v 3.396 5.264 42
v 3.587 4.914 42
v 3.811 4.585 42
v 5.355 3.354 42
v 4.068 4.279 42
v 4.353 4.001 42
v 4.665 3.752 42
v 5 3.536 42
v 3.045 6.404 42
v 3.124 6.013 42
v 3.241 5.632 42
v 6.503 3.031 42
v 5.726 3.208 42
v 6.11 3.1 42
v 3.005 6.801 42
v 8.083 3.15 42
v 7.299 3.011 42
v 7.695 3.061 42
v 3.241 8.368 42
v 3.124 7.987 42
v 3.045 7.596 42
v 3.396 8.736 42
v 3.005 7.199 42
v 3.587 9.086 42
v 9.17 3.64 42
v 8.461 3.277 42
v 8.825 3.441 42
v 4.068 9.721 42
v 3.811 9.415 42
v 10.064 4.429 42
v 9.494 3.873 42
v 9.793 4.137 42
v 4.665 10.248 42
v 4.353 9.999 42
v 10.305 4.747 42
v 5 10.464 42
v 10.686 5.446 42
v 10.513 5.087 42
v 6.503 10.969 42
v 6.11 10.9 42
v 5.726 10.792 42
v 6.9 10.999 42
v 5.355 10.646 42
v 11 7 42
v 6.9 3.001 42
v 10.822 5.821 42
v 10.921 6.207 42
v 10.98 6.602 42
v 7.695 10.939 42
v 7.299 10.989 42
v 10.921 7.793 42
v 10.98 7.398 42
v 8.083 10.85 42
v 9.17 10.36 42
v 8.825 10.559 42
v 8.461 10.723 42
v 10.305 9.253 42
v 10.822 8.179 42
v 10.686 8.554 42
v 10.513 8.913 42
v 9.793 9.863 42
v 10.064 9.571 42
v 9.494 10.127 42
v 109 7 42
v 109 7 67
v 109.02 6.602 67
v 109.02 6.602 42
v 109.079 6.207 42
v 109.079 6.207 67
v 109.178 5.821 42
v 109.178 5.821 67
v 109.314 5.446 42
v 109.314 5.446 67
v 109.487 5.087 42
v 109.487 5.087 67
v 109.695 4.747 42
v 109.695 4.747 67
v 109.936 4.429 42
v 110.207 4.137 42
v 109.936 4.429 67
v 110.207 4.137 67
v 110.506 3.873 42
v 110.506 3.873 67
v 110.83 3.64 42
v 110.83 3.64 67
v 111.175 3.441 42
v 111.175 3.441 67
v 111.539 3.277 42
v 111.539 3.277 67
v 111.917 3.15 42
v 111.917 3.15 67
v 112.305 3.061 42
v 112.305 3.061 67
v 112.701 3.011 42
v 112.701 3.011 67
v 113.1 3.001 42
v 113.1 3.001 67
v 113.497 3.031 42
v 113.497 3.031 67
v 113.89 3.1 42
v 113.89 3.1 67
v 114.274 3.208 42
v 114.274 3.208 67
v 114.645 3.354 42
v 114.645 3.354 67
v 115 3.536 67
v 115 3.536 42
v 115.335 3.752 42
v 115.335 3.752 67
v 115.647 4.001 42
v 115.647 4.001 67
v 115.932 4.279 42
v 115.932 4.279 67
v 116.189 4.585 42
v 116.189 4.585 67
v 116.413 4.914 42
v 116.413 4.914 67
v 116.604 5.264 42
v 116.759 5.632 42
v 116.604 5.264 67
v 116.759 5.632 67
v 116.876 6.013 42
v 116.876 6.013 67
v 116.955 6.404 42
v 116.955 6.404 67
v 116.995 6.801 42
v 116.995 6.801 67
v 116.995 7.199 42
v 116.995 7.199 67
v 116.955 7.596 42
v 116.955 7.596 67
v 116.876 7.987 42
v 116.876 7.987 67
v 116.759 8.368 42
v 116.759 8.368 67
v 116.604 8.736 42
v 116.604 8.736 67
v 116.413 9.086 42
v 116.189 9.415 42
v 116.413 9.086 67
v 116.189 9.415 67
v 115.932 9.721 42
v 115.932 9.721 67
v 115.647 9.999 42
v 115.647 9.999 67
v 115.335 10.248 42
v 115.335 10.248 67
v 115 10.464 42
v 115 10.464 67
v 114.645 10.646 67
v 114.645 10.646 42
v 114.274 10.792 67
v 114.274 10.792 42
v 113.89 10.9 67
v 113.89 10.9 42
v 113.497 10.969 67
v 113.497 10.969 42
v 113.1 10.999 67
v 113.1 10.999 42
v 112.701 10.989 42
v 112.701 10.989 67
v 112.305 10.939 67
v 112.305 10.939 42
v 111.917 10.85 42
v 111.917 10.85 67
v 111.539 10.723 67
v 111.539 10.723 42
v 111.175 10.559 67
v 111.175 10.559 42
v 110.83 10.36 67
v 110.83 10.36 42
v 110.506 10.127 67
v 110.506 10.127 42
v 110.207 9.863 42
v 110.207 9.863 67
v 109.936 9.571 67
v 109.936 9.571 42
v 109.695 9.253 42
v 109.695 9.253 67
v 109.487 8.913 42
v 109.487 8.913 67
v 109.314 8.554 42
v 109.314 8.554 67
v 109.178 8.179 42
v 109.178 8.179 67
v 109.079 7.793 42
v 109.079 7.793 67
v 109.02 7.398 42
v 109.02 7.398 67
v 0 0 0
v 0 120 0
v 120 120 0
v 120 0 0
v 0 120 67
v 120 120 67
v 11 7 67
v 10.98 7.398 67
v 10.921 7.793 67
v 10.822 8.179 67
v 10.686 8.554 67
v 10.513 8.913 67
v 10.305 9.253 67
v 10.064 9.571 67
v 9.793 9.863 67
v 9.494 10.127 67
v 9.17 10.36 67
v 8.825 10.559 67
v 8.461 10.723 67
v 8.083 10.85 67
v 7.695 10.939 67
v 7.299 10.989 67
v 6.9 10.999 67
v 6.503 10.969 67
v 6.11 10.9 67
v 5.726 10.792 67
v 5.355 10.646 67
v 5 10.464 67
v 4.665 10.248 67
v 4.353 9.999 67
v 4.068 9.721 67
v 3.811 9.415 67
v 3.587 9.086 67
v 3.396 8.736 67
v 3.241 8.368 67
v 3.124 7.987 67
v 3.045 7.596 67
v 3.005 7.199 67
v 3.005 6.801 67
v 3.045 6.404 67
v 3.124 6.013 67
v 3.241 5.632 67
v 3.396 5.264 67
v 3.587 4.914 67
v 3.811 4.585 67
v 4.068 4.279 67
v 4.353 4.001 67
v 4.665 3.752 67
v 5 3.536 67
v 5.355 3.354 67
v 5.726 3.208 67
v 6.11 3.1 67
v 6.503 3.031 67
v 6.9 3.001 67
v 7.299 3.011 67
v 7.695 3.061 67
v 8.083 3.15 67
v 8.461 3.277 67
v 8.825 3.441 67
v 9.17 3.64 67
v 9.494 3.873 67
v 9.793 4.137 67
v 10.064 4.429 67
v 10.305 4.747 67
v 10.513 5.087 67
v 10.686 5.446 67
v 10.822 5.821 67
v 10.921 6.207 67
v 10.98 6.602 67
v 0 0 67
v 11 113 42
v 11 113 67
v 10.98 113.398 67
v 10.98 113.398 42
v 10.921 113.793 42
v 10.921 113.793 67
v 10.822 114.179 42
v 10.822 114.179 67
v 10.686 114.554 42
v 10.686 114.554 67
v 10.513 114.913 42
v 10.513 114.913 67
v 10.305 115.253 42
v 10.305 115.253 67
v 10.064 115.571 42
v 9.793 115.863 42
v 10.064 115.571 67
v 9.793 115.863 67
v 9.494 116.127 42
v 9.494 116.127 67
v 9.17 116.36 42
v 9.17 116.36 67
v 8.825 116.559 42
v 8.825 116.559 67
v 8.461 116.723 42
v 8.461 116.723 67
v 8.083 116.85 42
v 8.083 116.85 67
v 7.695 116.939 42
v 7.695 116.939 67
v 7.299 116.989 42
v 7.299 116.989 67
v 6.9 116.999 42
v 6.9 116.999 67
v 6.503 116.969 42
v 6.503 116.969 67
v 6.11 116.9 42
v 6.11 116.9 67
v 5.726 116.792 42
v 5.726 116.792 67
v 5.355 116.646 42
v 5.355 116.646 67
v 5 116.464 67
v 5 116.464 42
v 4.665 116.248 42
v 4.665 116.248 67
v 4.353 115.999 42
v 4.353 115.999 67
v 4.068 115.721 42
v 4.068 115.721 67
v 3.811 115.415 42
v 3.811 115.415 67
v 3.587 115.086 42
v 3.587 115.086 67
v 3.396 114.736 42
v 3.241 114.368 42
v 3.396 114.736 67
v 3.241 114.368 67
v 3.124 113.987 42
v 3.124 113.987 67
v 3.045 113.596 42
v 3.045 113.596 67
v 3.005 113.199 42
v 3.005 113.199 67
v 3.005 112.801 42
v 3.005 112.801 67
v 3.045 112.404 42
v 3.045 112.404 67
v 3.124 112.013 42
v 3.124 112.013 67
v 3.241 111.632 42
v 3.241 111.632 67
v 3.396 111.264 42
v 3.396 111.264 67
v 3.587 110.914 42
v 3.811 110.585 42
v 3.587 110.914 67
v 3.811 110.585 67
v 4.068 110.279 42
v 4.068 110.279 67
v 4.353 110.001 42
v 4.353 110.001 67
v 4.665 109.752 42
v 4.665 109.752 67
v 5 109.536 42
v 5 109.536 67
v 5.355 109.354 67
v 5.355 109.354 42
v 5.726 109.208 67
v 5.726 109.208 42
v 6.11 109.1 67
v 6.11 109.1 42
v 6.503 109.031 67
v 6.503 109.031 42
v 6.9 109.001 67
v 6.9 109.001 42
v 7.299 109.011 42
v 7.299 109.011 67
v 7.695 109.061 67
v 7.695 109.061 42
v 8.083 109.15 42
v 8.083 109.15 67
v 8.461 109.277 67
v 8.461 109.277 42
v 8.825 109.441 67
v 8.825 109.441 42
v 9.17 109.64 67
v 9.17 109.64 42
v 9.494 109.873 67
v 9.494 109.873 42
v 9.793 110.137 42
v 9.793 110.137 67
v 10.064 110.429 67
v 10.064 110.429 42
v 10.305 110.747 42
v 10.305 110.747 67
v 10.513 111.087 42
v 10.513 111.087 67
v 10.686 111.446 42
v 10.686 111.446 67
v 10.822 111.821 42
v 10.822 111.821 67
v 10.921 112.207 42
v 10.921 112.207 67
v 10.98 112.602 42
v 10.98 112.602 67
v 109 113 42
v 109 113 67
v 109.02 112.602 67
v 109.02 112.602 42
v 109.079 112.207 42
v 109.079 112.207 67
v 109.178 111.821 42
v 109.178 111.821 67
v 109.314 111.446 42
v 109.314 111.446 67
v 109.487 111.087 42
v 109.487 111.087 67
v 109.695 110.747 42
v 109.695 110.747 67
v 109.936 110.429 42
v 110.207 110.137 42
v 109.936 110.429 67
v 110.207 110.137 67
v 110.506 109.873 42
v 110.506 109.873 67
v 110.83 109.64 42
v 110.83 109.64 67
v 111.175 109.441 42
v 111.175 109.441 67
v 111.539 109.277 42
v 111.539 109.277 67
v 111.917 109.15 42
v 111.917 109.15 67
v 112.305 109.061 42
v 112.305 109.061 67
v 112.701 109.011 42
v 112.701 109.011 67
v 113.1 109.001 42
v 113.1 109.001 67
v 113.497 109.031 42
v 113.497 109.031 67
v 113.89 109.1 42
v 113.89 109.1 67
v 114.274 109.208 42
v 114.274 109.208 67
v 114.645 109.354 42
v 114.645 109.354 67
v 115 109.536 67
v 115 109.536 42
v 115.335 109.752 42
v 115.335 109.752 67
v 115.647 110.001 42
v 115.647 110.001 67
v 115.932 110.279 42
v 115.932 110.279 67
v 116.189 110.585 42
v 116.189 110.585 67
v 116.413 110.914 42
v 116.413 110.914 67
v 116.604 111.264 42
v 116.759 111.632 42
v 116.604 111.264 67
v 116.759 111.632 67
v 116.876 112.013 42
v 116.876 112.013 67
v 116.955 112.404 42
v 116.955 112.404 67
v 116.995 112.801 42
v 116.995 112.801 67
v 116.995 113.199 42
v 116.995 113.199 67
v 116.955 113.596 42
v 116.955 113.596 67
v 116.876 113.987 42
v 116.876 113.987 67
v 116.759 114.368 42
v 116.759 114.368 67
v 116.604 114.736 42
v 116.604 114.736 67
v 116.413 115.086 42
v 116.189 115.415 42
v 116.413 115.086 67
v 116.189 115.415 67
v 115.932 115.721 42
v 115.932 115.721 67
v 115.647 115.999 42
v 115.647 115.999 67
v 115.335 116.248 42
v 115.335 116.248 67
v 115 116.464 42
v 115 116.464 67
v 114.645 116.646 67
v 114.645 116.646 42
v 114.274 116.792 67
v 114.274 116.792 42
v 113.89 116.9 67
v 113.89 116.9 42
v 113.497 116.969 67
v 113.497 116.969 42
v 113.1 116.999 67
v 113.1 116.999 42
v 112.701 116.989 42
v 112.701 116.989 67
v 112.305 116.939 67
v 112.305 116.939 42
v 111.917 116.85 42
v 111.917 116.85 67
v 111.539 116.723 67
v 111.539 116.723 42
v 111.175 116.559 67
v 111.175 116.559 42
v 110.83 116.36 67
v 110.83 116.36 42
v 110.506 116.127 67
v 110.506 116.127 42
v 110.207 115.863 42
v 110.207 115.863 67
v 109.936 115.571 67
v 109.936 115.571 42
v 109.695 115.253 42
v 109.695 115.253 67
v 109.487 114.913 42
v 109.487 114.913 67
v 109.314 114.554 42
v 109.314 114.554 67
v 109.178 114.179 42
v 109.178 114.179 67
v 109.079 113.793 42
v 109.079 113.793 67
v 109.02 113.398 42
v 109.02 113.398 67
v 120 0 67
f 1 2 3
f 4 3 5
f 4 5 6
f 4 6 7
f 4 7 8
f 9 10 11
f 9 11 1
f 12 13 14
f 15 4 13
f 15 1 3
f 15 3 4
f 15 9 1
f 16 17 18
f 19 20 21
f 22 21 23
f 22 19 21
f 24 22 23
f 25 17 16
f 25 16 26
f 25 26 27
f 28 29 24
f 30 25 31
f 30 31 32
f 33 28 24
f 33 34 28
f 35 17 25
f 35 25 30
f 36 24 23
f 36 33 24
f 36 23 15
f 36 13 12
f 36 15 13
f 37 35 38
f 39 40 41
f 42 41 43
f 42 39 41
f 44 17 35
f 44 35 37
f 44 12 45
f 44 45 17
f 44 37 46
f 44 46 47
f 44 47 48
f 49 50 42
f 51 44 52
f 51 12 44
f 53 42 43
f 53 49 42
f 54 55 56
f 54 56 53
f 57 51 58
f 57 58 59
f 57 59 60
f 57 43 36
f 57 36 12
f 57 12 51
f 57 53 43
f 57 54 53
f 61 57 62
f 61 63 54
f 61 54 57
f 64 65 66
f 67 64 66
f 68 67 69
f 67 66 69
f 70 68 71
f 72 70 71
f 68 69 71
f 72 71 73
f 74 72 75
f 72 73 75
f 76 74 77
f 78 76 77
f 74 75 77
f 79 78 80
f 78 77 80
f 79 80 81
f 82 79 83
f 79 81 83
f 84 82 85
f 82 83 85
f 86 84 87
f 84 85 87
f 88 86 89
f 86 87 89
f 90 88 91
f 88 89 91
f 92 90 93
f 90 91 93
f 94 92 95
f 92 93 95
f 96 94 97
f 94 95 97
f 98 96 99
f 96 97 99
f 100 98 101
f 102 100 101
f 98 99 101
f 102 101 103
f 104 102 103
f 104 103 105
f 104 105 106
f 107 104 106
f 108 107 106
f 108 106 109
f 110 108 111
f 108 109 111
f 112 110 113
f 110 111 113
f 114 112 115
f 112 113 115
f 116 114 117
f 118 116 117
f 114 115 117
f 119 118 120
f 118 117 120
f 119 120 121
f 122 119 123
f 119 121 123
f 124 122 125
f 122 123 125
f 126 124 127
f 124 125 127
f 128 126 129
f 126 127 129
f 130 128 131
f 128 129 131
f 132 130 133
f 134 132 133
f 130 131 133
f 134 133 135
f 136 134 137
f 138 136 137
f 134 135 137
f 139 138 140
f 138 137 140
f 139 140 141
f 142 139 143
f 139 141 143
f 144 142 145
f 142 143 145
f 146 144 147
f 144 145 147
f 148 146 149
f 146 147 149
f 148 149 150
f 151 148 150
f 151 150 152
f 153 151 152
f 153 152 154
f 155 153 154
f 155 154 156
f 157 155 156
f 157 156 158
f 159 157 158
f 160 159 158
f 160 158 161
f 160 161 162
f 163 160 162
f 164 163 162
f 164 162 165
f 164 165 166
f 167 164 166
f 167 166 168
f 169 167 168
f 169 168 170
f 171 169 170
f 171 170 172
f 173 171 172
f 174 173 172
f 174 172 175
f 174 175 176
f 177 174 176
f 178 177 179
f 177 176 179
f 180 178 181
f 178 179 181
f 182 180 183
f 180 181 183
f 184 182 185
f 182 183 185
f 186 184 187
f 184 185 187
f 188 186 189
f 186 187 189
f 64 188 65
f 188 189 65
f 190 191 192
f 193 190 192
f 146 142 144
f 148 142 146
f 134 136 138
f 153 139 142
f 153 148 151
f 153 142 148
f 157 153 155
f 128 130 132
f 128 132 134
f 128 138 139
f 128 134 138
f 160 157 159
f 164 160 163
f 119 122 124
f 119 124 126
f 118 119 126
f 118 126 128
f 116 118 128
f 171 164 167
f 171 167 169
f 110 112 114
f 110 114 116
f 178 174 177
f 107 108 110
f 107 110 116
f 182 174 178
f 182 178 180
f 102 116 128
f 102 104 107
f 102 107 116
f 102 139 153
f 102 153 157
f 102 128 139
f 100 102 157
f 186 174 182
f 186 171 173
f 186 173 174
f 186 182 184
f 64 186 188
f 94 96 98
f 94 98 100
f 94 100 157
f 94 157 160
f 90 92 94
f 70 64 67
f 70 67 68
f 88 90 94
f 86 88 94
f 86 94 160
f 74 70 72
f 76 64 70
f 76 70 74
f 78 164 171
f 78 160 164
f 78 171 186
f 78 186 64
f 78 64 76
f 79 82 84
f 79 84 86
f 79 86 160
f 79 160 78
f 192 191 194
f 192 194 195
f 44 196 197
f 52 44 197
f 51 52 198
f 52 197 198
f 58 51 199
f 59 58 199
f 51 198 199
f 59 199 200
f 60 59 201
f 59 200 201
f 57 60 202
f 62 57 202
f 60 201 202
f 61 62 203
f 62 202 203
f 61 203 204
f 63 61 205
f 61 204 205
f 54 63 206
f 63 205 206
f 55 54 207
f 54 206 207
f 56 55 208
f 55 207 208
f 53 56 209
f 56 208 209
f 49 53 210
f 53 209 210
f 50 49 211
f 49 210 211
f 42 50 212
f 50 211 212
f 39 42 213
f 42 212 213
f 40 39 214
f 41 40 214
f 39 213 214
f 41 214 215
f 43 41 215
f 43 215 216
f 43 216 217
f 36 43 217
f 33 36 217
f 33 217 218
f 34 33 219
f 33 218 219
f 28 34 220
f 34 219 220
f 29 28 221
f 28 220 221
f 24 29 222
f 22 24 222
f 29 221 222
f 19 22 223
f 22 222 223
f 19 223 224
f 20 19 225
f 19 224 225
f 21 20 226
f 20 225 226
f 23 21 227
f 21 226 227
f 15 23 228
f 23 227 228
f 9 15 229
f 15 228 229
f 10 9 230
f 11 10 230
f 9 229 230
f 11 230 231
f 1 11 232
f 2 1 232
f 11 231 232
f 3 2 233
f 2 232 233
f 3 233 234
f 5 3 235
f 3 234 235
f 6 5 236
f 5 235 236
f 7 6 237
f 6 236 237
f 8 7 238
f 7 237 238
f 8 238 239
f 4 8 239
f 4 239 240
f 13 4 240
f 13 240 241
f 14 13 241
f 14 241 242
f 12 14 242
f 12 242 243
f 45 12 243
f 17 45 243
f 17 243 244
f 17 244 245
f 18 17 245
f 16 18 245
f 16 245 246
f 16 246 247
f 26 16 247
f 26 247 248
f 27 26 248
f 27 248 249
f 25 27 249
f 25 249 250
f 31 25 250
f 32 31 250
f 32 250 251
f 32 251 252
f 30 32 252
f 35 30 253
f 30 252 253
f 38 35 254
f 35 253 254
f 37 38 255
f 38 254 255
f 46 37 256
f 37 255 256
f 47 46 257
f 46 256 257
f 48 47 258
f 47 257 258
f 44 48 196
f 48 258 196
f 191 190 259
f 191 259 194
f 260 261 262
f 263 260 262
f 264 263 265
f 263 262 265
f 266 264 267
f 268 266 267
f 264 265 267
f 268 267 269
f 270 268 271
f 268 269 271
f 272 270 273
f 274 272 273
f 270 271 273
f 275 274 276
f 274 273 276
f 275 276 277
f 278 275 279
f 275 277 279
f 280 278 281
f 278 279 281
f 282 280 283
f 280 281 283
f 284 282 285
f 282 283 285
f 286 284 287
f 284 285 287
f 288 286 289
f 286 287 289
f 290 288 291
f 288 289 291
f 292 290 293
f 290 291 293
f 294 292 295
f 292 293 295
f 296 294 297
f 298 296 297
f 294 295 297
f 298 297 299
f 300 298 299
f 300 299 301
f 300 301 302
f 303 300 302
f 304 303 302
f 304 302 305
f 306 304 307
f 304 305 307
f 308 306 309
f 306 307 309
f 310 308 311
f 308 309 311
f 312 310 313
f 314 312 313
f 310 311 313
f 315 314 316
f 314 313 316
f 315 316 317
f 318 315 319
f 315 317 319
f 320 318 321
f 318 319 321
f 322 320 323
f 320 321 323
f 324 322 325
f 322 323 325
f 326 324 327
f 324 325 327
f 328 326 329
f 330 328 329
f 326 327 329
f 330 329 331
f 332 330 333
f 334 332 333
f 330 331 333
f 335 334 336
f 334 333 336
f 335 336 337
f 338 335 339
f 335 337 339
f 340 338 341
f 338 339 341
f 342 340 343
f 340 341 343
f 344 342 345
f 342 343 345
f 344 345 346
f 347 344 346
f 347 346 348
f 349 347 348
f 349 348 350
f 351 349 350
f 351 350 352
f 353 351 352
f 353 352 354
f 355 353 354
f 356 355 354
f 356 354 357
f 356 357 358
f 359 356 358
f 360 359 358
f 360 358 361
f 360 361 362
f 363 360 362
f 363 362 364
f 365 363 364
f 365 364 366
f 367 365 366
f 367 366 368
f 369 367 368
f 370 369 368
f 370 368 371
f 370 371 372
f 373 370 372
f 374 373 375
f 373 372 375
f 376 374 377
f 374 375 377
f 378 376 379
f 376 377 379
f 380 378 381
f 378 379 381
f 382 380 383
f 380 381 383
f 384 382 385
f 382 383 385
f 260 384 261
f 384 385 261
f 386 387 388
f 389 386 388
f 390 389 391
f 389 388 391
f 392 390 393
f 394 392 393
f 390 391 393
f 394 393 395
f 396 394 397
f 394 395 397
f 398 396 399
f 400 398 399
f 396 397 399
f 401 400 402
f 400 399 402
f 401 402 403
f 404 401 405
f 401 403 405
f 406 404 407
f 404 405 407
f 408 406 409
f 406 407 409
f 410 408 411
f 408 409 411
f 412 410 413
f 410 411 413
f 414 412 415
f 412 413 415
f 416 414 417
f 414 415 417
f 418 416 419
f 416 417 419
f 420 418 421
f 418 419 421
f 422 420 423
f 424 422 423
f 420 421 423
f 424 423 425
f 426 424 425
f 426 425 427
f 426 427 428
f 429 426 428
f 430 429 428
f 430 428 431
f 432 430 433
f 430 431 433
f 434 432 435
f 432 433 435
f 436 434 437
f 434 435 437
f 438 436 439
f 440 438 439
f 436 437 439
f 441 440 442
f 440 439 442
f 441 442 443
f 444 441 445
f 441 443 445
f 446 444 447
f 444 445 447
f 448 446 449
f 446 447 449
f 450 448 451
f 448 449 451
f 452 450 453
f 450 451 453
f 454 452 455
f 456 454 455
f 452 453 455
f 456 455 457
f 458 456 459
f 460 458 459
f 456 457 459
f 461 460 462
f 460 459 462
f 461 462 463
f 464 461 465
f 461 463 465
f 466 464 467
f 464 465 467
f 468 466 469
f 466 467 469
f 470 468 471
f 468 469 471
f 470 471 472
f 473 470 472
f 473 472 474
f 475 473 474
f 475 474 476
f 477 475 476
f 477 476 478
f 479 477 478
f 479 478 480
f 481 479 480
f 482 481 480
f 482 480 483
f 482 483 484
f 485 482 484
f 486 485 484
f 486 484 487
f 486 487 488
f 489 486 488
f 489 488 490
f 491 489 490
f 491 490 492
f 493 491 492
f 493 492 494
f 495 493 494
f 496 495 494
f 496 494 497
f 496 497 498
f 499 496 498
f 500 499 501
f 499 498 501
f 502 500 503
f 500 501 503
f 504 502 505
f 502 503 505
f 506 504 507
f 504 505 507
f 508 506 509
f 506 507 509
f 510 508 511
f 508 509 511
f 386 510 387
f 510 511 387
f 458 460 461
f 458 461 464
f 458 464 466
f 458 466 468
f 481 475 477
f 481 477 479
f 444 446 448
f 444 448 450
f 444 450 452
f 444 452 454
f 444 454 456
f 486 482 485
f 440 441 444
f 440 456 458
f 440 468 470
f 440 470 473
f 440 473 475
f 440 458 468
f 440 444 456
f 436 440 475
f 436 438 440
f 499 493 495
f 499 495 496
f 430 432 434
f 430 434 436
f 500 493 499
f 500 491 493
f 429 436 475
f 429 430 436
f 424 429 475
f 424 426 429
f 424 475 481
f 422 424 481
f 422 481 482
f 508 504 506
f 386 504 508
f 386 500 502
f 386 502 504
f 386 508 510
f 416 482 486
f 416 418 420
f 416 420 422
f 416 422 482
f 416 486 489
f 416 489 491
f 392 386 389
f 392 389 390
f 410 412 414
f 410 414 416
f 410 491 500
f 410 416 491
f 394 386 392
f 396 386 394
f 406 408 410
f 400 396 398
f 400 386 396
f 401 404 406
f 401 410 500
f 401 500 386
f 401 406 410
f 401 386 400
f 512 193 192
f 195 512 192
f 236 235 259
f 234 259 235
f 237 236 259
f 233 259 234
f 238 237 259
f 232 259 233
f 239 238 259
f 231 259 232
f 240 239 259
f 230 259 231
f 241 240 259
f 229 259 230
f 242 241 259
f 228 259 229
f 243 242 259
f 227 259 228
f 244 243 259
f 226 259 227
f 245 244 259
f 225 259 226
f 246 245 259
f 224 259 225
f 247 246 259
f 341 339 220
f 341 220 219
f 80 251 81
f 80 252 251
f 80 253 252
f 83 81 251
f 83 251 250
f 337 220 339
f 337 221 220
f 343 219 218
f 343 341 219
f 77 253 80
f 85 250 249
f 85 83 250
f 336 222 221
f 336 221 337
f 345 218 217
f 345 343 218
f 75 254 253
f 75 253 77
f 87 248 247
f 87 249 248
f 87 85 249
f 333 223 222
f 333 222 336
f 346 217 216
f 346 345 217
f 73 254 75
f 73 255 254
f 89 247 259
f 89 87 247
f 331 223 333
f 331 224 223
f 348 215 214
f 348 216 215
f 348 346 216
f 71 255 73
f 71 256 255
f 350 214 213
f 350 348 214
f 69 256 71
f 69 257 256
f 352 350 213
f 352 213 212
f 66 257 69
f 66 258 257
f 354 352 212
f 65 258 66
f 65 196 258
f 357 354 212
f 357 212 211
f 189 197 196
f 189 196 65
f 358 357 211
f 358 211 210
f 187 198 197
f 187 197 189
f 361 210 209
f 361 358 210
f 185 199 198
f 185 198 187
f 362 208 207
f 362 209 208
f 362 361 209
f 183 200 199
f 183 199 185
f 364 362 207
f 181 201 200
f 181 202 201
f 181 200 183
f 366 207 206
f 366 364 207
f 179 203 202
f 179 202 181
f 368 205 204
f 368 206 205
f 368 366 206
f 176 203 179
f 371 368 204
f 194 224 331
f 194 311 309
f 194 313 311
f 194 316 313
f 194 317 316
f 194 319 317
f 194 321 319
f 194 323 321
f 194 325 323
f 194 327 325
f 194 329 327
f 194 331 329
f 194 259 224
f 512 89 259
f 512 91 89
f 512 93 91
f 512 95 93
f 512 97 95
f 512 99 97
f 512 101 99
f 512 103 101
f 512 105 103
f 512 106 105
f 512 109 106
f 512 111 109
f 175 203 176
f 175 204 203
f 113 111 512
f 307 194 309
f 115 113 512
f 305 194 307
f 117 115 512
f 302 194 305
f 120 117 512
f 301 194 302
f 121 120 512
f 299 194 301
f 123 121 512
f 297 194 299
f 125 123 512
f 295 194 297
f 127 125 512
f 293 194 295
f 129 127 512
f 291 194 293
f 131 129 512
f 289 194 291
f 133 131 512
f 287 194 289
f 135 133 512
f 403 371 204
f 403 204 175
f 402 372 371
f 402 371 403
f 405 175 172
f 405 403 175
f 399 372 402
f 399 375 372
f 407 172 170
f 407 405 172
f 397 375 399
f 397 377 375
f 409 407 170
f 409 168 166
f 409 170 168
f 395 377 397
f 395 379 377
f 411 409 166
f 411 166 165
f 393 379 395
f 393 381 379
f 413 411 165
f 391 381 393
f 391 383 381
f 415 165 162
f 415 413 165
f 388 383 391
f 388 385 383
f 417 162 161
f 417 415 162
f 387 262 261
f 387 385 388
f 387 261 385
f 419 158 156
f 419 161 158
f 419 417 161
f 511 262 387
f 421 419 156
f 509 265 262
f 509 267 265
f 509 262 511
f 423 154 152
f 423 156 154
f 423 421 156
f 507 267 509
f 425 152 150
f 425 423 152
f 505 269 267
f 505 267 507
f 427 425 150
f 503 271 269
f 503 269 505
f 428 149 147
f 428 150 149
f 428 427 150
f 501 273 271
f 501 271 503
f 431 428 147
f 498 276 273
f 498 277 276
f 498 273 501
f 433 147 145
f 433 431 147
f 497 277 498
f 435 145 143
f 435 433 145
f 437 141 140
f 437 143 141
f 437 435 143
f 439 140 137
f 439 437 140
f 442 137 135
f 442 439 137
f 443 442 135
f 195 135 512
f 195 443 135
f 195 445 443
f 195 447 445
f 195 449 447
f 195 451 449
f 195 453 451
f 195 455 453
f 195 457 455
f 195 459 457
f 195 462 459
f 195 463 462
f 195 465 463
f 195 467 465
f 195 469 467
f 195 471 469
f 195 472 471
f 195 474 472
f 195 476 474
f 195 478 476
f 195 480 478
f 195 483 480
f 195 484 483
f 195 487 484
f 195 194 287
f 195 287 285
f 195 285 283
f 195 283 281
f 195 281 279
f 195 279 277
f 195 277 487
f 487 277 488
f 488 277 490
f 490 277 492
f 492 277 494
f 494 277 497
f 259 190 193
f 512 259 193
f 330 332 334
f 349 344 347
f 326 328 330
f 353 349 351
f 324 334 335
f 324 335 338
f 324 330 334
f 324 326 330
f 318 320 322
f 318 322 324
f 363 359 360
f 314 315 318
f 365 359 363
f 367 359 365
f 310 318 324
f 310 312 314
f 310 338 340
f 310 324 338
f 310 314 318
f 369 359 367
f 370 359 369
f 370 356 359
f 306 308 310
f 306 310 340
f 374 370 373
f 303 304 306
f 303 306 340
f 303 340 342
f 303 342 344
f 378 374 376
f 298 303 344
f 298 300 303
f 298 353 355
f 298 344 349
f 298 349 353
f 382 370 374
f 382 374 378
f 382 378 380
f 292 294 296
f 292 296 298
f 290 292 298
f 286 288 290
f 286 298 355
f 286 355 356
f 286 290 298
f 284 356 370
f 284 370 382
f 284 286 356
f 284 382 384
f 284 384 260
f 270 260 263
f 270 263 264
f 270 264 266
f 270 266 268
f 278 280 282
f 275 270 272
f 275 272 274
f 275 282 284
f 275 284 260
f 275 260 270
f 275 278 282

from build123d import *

# Parameters (mm, degrees)
SZKIC1_W                    = 120
SZKIC1_H                    = 120
DODANIE_WYCI_GNI_CIE1_DEPTH = 67
SZKIC5_R                    = 4
WYTNIJ_WYCI_GNI_CIE1_DEPTH  = 25


with BuildPart() as part:
    # Szkic1 → Dodanie-wyciągnięcie1 (new body)
    with BuildSketch(Plane.XY):
        with Locations((60, 60)):
            Rectangle(SZKIC1_W, SZKIC1_H)
    extrude(amount=DODANIE_WYCI_GNI_CIE1_DEPTH)

    # Szkic5 → Wytnij-wyciągnięcie1 (cut)
    with BuildSketch(Plane.XY.offset(67)):
        with Locations((7, 113)):
            Circle(SZKIC5_R)
        with Locations((7, 7)):
            Circle(SZKIC5_R)
        with Locations(Location((113, 113, 0), (0, 0, 180))):
            Circle(SZKIC5_R)
        with Locations(Location((113, 7, 0), (0, 0, 180))):
            Circle(SZKIC5_R)
    extrude(amount=-WYTNIJ_WYCI_GNI_CIE1_DEPTH, mode=Mode.SUBTRACT)


solid = part.part
